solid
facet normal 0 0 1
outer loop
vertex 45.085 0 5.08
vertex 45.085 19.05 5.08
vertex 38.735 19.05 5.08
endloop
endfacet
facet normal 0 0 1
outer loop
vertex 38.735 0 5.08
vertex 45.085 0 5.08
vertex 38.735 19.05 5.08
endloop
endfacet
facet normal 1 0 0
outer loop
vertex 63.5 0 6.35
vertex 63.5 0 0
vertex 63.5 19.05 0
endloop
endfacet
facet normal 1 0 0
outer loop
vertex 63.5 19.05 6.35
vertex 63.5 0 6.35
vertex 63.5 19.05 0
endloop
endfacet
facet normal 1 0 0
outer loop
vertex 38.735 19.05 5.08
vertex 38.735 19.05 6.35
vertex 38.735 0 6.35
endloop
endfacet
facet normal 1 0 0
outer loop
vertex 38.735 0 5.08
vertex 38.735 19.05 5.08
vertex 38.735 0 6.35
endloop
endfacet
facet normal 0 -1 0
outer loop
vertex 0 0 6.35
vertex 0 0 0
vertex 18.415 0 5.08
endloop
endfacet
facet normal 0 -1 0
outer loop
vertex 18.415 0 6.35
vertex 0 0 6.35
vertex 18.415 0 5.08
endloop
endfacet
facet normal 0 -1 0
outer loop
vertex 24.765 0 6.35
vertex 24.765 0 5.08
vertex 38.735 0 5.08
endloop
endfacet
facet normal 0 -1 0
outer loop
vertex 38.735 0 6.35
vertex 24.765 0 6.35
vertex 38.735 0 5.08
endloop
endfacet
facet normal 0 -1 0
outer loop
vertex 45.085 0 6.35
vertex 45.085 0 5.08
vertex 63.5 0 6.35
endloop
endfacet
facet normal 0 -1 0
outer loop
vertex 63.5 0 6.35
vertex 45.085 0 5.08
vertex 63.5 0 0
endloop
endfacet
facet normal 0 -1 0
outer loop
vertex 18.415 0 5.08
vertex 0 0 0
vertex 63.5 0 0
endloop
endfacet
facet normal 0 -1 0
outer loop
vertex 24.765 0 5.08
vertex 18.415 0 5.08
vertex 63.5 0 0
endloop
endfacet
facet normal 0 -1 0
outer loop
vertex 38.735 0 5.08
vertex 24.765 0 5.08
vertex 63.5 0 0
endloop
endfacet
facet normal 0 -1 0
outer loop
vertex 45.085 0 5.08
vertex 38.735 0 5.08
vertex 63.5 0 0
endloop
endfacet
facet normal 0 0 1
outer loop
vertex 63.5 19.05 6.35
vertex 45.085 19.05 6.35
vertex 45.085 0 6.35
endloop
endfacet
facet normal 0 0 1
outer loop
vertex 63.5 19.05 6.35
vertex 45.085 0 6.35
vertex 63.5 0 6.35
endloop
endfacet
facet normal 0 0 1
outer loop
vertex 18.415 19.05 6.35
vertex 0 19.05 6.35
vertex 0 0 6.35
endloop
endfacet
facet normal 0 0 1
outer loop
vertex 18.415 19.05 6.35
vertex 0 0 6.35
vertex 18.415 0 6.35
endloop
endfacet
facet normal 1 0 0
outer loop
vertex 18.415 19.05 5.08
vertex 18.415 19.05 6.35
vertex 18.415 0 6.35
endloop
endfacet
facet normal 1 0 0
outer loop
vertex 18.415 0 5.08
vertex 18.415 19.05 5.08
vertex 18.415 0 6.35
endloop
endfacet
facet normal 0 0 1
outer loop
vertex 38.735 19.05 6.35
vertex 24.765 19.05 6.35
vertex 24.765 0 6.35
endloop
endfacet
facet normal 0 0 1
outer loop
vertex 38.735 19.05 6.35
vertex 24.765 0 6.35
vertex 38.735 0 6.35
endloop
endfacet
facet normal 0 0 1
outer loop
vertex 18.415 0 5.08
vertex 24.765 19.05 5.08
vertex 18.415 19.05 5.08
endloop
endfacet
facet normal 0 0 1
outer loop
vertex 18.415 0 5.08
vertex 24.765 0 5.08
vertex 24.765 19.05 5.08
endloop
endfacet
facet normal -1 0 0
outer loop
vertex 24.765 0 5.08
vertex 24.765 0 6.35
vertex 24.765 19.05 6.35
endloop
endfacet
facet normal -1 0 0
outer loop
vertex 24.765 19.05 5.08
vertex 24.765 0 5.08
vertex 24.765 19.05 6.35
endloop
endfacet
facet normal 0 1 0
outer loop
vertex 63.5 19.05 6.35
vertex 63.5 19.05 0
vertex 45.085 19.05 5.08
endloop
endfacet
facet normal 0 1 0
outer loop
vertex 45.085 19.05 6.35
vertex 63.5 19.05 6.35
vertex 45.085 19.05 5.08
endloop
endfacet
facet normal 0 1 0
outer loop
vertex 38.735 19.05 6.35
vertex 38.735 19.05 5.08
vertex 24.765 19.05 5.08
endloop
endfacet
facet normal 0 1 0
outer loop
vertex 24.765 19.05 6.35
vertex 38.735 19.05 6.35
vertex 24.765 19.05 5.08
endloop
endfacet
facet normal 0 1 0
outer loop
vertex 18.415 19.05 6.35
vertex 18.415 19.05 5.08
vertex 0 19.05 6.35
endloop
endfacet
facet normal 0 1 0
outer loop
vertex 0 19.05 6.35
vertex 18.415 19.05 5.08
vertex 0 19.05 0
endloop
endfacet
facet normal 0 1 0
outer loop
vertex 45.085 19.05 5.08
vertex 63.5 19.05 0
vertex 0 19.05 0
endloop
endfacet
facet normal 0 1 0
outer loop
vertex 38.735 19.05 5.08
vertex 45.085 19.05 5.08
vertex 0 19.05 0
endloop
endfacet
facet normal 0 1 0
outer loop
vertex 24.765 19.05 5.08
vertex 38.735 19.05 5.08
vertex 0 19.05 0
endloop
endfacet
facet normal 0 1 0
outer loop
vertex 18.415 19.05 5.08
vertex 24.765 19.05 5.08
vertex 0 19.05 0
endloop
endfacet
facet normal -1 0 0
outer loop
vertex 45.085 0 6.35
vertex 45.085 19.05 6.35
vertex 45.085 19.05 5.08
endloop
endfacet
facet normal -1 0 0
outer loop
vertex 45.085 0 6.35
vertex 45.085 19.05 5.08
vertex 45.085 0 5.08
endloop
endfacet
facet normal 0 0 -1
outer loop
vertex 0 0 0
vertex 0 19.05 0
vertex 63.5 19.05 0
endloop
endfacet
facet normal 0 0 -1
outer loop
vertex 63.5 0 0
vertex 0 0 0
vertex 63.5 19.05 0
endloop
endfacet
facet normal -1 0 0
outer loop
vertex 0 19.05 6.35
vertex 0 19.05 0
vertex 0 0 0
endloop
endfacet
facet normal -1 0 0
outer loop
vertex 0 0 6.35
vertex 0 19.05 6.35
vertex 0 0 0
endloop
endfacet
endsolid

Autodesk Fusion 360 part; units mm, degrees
sketch "Sketch1" plane through (0, 0, 0) normal (0, 0, 1) x (1, 0, 0)
  line L0 (0, 0) -> (63.5, 0)
  line L1 (63.5, 0) -> (63.5, 19.05)
  line L2 (63.5, 19.05) -> (0, 19.05)
  line L3 (0, 19.05) -> (0, 0)
  dimension "d1" = 63.5
  dimension "d2" = 19.05
extrude "Extrude1" add sketch "Sketch1" along normal blind 6.35
sketch "Sketch2" plane through (0, 0, 6.35) normal (0, 0, 1) x (-1, 0, 0)
  line L0 (0, -19.05) -> (0, 0)
  line L1 (0, 0) -> (-63.5, 0)
  line L2 (-63.5, 0) -> (-63.5, -19.05)
  line L3 (-63.5, -19.05) -> (0, -19.05)
  line L4 (0, 0) -> (0, -9.525)
  line L5 (0, -19.05) -> (-9.2075, -19.05)
  circle A0 centre (-9.2075, -9.4653) radius 4.0005
  line L6 (0, -19.05) -> (-18.415, -19.05)
  line L7 (-1.154, -19.05) -> (-2.7137, -19.7589)
  line L8 (0, -19.05) -> (-24.765, -19.05)
  line L9 (-24.765, -19.05) -> (-18.415, -19.05)
  line L10 (-18.415, -19.05) -> (-18.415, 0)
  line L11 (-18.415, 0) -> (-24.765, 0)
  line L12 (-24.765, 0) -> (-24.765, -19.05)
  line L13 (-24.765, -19.05) -> (-38.735, -19.05)
  line L14 (-63.5, -19.05) -> (-54.2925, -19.05)
  line L15 (-63.5, -19.05) -> (-45.085, -19.05)
  line L16 (-63.5, 0) -> (-63.5, -9.525)
  circle A1 centre (-54.2925, -9.6525) radius 4.0005
  line L17 (-38.735, -19.05) -> (-38.735, 0)
  line L18 (-45.085, -19.05) -> (-45.085, 0)
  line L19 (-45.085, -19.05) -> (-38.735, -19.05)
  line L20 (-38.735, -19.05) -> (-38.735, 0)
  line L21 (-38.735, 0) -> (-45.085, 0)
  line L22 (-45.085, 0) -> (-45.085, -19.05)
  dimension "d5" = 9.525
  dimension "d6" = 9.2075
  dimension "d7" = 8.001
  dimension "d8" = 18.415
  dimension "d9" = 24.765
  dimension "d10" = 6.35
  dimension "d11" = 19.05
  dimension "d12" = 13.97
  dimension "d13" = 9.2075
  dimension "d14" = 18.415
  dimension "d15" = 9.525
  dimension "d16" = 8.001
extrude "Extrude2" cut sketch "Sketch2" against normal blind 1.27 contours L1 L3 L8 L9 L10 L11 L12 | L1 L3 L17 L18 L19 L20 L21 L22
